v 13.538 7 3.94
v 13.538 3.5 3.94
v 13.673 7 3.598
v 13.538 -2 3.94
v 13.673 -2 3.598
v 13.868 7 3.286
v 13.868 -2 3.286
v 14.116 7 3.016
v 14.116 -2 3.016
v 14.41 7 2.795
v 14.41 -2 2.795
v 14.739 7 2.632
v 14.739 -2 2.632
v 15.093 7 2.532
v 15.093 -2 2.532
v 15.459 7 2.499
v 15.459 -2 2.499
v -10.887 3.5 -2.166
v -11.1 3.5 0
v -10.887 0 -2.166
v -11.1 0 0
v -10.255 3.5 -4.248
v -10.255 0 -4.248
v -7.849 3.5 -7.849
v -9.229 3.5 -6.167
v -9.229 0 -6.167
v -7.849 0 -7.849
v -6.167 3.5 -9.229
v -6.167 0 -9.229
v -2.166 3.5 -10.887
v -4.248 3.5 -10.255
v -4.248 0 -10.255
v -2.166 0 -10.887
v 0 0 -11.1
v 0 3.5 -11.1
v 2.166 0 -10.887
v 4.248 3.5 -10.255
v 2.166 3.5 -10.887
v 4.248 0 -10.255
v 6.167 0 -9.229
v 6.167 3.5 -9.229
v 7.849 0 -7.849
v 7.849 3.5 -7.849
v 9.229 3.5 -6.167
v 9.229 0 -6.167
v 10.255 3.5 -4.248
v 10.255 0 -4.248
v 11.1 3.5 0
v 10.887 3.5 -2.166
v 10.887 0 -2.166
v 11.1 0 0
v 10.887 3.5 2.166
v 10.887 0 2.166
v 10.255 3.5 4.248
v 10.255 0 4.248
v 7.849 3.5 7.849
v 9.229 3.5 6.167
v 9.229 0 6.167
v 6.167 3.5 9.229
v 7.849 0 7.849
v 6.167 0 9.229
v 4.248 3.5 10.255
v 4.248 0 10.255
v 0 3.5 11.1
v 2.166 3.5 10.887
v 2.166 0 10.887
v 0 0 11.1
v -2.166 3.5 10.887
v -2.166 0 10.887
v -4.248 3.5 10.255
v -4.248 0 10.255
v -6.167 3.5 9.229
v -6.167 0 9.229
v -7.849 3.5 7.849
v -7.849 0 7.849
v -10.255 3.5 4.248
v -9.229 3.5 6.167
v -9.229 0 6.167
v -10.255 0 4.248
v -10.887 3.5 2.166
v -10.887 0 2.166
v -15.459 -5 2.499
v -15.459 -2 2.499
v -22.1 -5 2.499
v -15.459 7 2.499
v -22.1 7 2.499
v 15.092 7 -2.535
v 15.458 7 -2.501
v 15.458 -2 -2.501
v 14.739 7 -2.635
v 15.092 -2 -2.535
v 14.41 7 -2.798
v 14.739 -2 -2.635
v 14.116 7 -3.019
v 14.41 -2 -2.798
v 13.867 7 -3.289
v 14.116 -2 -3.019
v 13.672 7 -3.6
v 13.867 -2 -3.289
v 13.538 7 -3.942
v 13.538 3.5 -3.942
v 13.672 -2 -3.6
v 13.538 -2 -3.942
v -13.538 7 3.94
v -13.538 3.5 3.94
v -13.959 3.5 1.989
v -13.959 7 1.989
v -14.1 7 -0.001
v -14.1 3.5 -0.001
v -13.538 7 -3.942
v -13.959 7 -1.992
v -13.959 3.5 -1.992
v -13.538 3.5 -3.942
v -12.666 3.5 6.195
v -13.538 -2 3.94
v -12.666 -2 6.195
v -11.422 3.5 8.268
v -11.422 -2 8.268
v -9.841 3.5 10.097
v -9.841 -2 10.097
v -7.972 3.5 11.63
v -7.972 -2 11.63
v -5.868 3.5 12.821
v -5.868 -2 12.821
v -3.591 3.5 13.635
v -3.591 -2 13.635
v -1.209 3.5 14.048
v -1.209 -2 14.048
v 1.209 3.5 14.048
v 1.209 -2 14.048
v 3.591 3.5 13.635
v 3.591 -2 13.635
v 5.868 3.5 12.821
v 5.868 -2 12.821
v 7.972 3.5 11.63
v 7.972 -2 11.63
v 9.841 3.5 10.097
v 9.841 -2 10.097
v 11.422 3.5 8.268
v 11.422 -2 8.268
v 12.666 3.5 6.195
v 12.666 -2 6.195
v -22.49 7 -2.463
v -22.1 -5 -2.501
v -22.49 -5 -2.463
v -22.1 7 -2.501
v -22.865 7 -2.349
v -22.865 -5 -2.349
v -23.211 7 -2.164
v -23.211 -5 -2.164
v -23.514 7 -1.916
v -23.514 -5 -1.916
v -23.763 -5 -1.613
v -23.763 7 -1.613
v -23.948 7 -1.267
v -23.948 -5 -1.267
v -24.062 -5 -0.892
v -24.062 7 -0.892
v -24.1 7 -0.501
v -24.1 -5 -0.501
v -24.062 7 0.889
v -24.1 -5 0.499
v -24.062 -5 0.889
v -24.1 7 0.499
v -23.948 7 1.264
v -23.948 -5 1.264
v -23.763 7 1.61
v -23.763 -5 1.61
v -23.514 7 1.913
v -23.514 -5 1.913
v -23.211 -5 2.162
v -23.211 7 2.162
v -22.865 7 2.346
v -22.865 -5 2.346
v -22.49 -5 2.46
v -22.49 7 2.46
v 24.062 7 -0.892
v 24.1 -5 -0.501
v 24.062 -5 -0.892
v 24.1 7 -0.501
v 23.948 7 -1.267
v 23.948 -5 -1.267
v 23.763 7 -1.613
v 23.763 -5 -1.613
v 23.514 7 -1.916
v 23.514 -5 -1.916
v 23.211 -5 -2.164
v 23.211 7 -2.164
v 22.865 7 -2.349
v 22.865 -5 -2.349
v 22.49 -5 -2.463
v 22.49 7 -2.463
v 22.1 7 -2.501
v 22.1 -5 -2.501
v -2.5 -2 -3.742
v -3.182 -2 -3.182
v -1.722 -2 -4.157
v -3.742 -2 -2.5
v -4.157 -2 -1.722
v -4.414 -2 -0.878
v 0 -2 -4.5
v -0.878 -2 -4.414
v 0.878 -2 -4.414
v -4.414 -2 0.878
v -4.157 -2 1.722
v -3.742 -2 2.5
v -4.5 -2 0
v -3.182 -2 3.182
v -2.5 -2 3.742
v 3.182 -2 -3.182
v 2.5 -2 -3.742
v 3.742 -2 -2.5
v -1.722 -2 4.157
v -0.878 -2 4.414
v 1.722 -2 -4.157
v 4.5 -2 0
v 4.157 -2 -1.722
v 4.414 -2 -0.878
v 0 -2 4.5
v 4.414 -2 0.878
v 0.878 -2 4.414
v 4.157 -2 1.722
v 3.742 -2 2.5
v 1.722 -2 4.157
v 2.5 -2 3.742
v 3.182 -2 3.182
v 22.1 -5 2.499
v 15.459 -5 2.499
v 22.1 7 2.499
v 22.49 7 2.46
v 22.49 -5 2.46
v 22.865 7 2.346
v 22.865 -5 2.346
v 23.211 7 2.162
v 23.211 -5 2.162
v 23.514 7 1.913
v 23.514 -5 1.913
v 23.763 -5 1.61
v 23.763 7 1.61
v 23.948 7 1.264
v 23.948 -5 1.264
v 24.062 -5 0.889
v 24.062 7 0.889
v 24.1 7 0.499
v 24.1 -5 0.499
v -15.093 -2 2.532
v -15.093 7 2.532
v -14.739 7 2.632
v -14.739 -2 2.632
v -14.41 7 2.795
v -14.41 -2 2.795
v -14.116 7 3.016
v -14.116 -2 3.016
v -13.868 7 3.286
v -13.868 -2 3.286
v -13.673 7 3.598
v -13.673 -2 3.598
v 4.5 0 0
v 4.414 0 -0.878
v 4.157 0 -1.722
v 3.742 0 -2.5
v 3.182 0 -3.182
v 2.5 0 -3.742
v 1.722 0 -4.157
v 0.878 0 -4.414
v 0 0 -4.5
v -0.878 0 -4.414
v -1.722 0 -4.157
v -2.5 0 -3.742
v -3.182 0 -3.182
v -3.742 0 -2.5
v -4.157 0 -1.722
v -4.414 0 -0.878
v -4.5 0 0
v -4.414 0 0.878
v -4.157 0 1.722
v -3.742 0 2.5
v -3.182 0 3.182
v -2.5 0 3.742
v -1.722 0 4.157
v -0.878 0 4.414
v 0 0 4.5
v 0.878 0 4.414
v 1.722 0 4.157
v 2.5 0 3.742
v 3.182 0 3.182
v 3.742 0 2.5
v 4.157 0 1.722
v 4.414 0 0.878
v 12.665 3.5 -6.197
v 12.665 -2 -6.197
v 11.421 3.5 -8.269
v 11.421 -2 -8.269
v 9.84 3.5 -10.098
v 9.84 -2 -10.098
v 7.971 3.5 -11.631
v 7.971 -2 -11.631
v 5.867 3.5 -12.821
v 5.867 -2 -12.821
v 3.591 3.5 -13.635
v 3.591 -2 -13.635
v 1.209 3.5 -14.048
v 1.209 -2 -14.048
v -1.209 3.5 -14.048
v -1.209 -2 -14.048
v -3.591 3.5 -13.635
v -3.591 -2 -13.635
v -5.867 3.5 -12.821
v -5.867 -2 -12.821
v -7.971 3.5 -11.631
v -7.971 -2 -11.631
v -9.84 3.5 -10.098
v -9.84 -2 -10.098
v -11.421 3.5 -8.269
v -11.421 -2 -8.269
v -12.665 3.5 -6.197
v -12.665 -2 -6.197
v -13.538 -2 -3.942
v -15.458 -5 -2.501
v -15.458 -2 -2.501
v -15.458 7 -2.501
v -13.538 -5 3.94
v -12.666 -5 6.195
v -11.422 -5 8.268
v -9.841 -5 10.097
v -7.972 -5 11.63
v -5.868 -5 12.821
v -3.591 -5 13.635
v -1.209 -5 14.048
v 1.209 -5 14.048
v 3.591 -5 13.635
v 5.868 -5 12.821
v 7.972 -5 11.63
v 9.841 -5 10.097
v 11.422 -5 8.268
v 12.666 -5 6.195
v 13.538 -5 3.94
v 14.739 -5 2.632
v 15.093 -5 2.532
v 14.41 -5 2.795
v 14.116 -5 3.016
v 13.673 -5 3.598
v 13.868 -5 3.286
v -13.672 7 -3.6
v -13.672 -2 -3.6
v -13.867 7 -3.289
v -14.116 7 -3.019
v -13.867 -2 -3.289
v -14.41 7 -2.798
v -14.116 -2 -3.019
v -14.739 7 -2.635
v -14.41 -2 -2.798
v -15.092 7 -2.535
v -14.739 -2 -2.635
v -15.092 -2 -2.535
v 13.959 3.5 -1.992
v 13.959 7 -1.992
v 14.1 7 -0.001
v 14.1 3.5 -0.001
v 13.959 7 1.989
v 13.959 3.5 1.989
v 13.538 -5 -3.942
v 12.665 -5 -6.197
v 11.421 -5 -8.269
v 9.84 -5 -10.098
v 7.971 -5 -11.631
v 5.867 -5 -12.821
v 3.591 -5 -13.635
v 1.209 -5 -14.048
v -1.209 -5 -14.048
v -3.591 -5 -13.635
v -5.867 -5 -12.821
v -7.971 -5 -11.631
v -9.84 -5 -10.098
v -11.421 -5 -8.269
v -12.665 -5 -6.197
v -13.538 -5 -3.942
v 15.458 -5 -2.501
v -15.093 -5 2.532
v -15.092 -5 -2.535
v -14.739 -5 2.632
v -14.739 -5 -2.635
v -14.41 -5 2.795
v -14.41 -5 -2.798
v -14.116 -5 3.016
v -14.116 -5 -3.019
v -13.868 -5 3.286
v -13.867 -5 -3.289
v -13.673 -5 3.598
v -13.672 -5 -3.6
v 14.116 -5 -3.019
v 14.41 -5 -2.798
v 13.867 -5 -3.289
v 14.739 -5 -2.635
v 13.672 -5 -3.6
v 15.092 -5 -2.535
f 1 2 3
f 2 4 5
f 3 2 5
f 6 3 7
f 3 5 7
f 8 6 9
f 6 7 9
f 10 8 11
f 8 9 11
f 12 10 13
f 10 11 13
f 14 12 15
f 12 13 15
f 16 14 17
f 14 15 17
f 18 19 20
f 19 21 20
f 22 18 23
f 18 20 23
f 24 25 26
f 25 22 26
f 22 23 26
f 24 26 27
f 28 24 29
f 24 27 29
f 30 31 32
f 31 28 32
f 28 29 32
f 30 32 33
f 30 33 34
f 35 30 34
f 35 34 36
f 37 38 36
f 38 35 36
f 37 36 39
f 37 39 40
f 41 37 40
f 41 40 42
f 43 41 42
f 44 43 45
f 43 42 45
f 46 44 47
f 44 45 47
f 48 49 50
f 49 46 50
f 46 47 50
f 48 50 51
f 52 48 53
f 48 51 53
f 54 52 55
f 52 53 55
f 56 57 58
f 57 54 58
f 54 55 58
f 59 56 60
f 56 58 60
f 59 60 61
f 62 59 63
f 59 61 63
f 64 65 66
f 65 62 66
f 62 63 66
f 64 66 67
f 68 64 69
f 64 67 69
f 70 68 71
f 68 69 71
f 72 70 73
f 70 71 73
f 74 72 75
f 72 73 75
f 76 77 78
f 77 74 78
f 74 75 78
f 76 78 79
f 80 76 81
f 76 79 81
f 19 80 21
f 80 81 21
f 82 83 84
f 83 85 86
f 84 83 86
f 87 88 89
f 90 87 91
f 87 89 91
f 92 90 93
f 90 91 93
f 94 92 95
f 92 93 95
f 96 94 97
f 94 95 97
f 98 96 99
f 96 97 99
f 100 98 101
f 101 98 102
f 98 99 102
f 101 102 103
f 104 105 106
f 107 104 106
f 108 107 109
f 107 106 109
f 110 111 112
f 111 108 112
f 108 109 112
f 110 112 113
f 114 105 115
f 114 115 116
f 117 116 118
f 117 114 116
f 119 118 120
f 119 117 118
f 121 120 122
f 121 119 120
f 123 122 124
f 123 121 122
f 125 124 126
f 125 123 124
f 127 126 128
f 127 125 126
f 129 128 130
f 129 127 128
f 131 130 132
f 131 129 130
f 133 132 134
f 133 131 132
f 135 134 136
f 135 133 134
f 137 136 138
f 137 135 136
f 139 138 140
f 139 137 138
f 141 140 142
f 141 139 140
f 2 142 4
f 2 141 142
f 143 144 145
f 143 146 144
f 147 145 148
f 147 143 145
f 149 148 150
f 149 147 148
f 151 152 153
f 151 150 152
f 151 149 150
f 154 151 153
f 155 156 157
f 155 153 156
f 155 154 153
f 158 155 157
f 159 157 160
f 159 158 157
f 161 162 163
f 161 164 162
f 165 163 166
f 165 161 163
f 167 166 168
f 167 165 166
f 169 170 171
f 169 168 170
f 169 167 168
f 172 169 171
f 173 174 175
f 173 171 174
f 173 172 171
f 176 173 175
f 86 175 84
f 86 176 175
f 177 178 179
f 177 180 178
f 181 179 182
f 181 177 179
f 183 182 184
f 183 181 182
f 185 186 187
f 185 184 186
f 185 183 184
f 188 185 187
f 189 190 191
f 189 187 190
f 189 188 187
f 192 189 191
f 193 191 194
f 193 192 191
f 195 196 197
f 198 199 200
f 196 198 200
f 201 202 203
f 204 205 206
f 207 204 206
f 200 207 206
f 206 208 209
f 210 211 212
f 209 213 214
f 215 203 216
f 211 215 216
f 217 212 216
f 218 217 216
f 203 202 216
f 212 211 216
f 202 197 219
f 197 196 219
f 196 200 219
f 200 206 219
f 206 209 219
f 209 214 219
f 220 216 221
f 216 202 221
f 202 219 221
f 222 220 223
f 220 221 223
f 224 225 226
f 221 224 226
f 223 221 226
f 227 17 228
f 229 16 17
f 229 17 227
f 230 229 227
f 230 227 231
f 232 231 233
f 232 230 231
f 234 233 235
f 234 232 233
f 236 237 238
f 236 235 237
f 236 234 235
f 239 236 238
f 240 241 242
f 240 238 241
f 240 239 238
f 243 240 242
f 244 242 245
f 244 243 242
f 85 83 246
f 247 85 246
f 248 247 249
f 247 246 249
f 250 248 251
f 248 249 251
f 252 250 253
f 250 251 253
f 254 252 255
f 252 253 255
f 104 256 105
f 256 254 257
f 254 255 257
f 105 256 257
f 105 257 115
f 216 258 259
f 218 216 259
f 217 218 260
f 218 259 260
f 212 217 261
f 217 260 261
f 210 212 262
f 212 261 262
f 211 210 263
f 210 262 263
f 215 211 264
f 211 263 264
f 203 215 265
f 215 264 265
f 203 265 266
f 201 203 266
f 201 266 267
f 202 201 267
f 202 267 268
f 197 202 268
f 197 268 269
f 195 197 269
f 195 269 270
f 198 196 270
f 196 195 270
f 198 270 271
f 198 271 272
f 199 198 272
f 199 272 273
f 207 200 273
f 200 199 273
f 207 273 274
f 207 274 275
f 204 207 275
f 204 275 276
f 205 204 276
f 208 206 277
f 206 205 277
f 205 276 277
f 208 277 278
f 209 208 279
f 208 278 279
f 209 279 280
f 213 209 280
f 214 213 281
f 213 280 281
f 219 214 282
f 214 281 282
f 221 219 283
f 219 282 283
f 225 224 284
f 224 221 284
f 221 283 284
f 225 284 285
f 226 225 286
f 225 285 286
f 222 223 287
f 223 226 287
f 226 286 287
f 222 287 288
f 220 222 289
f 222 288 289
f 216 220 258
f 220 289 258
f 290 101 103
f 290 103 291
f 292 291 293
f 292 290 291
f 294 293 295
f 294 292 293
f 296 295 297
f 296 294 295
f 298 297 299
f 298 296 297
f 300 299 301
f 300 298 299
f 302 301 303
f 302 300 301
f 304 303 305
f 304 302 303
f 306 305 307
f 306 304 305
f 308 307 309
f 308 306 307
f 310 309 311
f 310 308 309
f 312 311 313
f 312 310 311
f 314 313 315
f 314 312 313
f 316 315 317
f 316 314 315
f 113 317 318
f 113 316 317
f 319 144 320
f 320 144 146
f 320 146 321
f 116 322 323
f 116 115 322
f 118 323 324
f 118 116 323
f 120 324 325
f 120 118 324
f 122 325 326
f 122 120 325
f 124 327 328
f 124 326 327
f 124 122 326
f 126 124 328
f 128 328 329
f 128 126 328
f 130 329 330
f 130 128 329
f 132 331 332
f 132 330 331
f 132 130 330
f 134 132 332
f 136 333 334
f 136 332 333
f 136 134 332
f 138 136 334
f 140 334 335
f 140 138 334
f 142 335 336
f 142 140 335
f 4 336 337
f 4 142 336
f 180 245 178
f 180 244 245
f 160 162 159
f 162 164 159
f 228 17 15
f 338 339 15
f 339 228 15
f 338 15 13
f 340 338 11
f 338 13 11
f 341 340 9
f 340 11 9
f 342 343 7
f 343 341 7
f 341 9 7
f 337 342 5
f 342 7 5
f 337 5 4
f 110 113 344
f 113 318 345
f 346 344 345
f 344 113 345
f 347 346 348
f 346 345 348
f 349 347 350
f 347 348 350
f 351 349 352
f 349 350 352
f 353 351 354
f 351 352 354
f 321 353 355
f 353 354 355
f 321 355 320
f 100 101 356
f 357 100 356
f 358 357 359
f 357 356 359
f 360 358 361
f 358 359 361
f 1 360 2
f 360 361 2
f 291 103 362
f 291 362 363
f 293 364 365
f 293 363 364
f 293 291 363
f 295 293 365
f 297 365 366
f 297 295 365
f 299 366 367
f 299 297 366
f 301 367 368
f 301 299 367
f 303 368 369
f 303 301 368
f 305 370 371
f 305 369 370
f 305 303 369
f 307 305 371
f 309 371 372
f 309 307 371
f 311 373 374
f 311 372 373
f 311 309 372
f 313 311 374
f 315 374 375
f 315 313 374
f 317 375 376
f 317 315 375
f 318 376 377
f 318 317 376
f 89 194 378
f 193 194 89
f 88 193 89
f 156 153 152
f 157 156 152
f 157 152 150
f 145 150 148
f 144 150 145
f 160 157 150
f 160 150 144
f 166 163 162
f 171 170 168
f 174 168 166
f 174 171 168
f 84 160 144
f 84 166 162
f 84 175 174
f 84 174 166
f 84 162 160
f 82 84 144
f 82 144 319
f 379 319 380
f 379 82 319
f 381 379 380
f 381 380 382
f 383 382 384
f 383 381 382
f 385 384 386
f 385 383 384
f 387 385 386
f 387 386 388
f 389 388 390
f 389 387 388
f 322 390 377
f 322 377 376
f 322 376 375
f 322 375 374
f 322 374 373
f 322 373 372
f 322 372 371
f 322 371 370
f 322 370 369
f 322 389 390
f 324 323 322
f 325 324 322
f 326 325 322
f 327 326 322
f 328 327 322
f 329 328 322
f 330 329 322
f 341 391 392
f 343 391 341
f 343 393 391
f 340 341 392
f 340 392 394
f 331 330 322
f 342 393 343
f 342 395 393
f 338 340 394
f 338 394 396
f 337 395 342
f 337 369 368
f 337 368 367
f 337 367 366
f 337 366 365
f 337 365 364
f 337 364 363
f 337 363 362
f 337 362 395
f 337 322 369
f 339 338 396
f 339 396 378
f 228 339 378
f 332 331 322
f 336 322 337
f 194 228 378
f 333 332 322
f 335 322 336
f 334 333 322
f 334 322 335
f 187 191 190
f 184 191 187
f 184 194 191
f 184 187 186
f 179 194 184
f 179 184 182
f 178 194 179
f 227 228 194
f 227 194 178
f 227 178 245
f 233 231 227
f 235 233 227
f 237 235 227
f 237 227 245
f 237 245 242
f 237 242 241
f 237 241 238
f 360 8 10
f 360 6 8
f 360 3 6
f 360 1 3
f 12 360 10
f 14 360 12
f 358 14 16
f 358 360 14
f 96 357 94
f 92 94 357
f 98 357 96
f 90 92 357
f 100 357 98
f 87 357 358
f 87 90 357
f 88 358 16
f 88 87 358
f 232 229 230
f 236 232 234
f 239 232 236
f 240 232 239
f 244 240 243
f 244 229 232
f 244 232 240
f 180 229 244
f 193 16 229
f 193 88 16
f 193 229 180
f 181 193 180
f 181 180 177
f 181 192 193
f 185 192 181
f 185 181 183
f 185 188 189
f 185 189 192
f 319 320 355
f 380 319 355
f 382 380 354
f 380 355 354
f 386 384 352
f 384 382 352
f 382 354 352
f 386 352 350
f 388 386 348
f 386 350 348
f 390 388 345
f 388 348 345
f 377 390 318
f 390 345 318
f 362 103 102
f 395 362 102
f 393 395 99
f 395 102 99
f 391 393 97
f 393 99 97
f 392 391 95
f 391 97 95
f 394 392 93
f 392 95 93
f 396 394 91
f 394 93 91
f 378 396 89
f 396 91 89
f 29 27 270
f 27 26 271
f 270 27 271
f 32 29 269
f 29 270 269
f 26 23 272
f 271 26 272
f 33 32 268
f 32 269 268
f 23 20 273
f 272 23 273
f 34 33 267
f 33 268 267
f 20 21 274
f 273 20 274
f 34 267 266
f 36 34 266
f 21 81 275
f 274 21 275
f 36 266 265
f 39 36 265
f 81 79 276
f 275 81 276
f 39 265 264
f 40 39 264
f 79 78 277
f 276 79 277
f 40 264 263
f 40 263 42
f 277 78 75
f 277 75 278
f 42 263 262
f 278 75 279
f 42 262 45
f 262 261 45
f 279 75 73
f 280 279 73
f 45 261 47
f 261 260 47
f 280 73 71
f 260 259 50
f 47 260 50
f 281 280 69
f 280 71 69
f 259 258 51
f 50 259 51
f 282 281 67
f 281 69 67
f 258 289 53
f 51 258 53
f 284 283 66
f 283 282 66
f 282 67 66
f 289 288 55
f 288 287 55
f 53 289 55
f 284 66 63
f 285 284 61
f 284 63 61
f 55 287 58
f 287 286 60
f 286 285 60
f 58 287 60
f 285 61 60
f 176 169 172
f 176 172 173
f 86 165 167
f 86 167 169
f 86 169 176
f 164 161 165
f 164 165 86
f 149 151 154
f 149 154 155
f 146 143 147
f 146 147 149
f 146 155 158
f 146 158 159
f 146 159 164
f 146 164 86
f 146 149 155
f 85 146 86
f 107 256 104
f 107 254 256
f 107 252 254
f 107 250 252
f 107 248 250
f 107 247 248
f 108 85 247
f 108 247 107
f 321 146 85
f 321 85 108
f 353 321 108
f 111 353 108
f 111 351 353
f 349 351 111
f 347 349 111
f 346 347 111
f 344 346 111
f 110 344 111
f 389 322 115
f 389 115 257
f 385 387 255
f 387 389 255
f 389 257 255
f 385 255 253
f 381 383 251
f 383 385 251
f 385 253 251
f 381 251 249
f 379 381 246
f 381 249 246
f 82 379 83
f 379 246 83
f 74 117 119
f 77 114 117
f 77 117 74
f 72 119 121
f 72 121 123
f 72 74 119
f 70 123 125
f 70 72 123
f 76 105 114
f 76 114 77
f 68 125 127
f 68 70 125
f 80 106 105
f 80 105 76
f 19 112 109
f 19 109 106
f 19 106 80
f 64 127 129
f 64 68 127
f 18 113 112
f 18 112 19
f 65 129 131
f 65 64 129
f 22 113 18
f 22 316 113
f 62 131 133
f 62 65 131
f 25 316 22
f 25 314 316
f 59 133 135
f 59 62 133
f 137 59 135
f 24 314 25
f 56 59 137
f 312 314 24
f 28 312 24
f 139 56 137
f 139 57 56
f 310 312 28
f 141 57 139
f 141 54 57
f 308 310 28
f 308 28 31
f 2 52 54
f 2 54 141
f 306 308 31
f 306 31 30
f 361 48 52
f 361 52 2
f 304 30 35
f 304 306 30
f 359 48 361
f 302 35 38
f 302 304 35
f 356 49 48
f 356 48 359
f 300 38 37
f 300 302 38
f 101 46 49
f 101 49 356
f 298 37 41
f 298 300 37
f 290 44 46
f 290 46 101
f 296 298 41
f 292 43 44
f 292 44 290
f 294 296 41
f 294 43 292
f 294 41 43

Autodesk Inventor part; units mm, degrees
ref_plane "YZ Plane" through (0, 0, 0) normal (1, 0, 0) x (0, 1, 0)
ref_plane "XZ Plane" through (0, 0, 0) normal (0, 1, 0) x (-1, 0, 0)
ref_plane "XY Plane" through (0, 0, 0) normal (0, 0, 1) x (1, 0, 0)
sketch "Sketch2" plane through (0, 0, 0) normal (0, 1, 0) x (-1, 0, 0)
  circle A0 centre (0, 0) radius 11.1
  circle A1 centre (0, 0) radius 14.1
  dimension "d5" = 22.2
  dimension "d6" = 3
extrude "Extrusion2" add sketch "Sketch2" along normal blind 3.5
sketch "Sketch3" plane through (0, 0, 0) normal (0, -1, 0) x (1, 0, 0)
  circle A0 centre (0, 0) radius 14.1 projected
  circle A1 centre (0, 0) radius 4.5
  dimension "d9" = 9
extrude "Extrusion3" add sketch "Sketch3" along normal blind 2
sketch "Sketch4" plane through (0, -2, 0) normal (0, -1, 0) x (1, 0, 0)
  line L0 (-22.1, -2.5014) -> (-15.4579, -2.5014)
  line L1 (-15.4587, 2.4986) -> (-22.1, 2.4986)
  line L2 (-24.1, 0.4986) -> (-24.1, -0.5014)
  line L3 (-24.1, -2.5014) -> (-14.1, 2.4986) construction
  line L4 (-14.1, -2.5014) -> (-24.1, 2.4986) construction
  line L5 (-14.1, -2.5014) -> (-13.8763, -2.5014)
  line L6 (-14.1, 2.4986) -> (-13.8769, 2.4986)
  arc A0 (-13.5377, -3.9422) -> (-15.4579, -2.5014) centre (-15.4579, -4.5014) ccw
  arc A1 (-15.4587, 2.4986) -> (-13.5384, 3.9397) centre (-15.4587, 4.4986) ccw
  arc A2 (-24.1, -0.5014) -> (-22.1, -2.5014) centre (-22.1, -0.5014) ccw
  arc A3 (-22.1, 2.4986) -> (-24.1, 0.4986) centre (-22.1, 0.4986) ccw
  line L7 (0, -19.3985) -> (0, 27.2303) construction
  line L8 (22.1, -2.5014) -> (15.4579, -2.5014)
  line L9 (15.4587, 2.4986) -> (22.1, 2.4986)
  line L10 (24.1, 0.4986) -> (24.1, -0.5014)
  arc A4 (15.4579, -2.5014) -> (13.5377, -3.9422) centre (15.4579, -4.5014) ccw
  arc A5 (13.5384, 3.9397) -> (15.4587, 2.4986) centre (15.4587, 4.4986) ccw
  arc A6 (22.1, -2.5014) -> (24.1, -0.5014) centre (22.1, -0.5014) ccw
  arc A7 (24.1, 0.4986) -> (22.1, 2.4986) centre (22.1, 0.4986) ccw
  arc A8 (-13.5377, -3.9422) -> (13.5377, -3.9422) centre (0, 0) ccw
  arc A9 (13.5384, 3.9397) -> (-13.5384, 3.9397) centre (0, 0) ccw
  point P0 (-19.1, -0.0014)
  point P1 (14.1, 0)
  point P2 (-14.1, 0)
  point P3 (-14.1, 0)
  dimension "d13" = 5
  dimension "d14" = 2
extrude "Extrusion4" add sketch "Sketch4" along normal blind 3
sketch "Sketch5" plane through (0, -2, 0) normal (0, 1, 0) x (1, 0, 0)
  arc A0 (-13.5377, 3.9422) -> (-13.5384, -3.9397) centre (0, 0) ccw projected
  arc A1 (-15.4579, 2.5014) -> (-13.5377, 3.9422) centre (-15.4579, 4.5014) ccw projected
  line L0 (-22.1, 2.5014) -> (-15.4579, 2.5014) projected
  arc A2 (-22.1, 2.5014) -> (-24.1, 0.5014) centre (-22.1, 0.5014) ccw projected
  line L1 (-24.1, -0.4986) -> (-24.1, 0.5014) projected
  arc A3 (-24.1, -0.4986) -> (-22.1, -2.4986) centre (-22.1, -0.4986) ccw projected
  line L2 (-15.4587, -2.4986) -> (-22.1, -2.4986) projected
  arc A4 (-13.5384, -3.9397) -> (-15.4587, -2.4986) centre (-15.4587, -4.4986) ccw projected
  arc A5 (13.5384, -3.9397) -> (13.5377, 3.9422) centre (0, 0) ccw projected
  arc A6 (15.4587, -2.4986) -> (13.5384, -3.9397) centre (15.4587, -4.4986) ccw projected
  line L3 (22.1, -2.4986) -> (15.4587, -2.4986) projected
  arc A7 (22.1, -2.4986) -> (24.1, -0.4986) centre (22.1, -0.4986) ccw projected
  line L4 (24.1, 0.5014) -> (24.1, -0.4986) projected
  arc A8 (24.1, 0.5014) -> (22.1, 2.5014) centre (22.1, 0.5014) ccw projected
  line L5 (15.4579, 2.5014) -> (22.1, 2.5014) projected
  arc A9 (13.5377, 3.9422) -> (15.4579, 2.5014) centre (15.4579, 4.5014) ccw projected
extrude "Extrusion5" add sketch "Sketch5" along normal up to surface (5.5 mm away)
sketch "Sketch6" plane through (0, 3.5, 0) normal (0, 1, 0) x (1, 0, 0)
  arc A0 (-15.4579, 2.5014) -> (-13.5377, 3.9422) centre (-15.4579, 4.5014) ccw projected
  line L0 (-22.1, 2.5014) -> (-15.4579, 2.5014) projected
  arc A1 (-22.1, 2.5014) -> (-24.1, 0.5014) centre (-22.1, 0.5014) ccw projected
  line L1 (-24.1, -0.4986) -> (-24.1, 0.5014) projected
  arc A2 (-24.1, -0.4986) -> (-22.1, -2.4986) centre (-22.1, -0.4986) ccw projected
  line L2 (-15.4587, -2.4986) -> (-22.1, -2.4986) projected
  arc A3 (-13.5384, -3.9397) -> (-15.4587, -2.4986) centre (-15.4587, -4.4986) ccw projected
  arc A4 (-13.5377, 3.9422) -> (-13.5384, -3.9397) centre (0, 0) ccw projected
  arc A5 (15.4587, -2.4986) -> (13.5384, -3.9397) centre (15.4587, -4.4986) ccw projected
  line L3 (22.1, -2.4986) -> (15.4587, -2.4986) projected
  arc A6 (22.1, -2.4986) -> (24.1, -0.4986) centre (22.1, -0.4986) ccw projected
  line L4 (24.1, 0.5014) -> (24.1, -0.4986) projected
  arc A7 (24.1, 0.5014) -> (22.1, 2.5014) centre (22.1, 0.5014) ccw projected
  line L5 (15.4579, 2.5014) -> (22.1, 2.5014) projected
  arc A8 (13.5377, 3.9422) -> (15.4579, 2.5014) centre (15.4579, 4.5014) ccw projected
  arc A9 (13.5384, -3.9397) -> (13.5377, 3.9422) centre (0, 0) ccw projected
extrude "Extrusion6" add sketch "Sketch6" along normal blind 3.5
sketch "Sketch1" plane through (0, 0, 0) normal (0, 1, 0) x (-1, 0, 0)
  line L0 (40, 40) -> (-40, 40)
  line L1 (-40, 40) -> (-40, -40)
  line L2 (-40, -40) -> (40, -40)
  line L3 (40, -40) -> (40, 40)
  line L4 (40, 40) -> (-40, -40) construction
  line L5 (-40, 40) -> (40, -40) construction
  point P0 (0, 0)
  dimension "d0" = 80
  dimension "d1" = 80
properties part number "caja_down"
